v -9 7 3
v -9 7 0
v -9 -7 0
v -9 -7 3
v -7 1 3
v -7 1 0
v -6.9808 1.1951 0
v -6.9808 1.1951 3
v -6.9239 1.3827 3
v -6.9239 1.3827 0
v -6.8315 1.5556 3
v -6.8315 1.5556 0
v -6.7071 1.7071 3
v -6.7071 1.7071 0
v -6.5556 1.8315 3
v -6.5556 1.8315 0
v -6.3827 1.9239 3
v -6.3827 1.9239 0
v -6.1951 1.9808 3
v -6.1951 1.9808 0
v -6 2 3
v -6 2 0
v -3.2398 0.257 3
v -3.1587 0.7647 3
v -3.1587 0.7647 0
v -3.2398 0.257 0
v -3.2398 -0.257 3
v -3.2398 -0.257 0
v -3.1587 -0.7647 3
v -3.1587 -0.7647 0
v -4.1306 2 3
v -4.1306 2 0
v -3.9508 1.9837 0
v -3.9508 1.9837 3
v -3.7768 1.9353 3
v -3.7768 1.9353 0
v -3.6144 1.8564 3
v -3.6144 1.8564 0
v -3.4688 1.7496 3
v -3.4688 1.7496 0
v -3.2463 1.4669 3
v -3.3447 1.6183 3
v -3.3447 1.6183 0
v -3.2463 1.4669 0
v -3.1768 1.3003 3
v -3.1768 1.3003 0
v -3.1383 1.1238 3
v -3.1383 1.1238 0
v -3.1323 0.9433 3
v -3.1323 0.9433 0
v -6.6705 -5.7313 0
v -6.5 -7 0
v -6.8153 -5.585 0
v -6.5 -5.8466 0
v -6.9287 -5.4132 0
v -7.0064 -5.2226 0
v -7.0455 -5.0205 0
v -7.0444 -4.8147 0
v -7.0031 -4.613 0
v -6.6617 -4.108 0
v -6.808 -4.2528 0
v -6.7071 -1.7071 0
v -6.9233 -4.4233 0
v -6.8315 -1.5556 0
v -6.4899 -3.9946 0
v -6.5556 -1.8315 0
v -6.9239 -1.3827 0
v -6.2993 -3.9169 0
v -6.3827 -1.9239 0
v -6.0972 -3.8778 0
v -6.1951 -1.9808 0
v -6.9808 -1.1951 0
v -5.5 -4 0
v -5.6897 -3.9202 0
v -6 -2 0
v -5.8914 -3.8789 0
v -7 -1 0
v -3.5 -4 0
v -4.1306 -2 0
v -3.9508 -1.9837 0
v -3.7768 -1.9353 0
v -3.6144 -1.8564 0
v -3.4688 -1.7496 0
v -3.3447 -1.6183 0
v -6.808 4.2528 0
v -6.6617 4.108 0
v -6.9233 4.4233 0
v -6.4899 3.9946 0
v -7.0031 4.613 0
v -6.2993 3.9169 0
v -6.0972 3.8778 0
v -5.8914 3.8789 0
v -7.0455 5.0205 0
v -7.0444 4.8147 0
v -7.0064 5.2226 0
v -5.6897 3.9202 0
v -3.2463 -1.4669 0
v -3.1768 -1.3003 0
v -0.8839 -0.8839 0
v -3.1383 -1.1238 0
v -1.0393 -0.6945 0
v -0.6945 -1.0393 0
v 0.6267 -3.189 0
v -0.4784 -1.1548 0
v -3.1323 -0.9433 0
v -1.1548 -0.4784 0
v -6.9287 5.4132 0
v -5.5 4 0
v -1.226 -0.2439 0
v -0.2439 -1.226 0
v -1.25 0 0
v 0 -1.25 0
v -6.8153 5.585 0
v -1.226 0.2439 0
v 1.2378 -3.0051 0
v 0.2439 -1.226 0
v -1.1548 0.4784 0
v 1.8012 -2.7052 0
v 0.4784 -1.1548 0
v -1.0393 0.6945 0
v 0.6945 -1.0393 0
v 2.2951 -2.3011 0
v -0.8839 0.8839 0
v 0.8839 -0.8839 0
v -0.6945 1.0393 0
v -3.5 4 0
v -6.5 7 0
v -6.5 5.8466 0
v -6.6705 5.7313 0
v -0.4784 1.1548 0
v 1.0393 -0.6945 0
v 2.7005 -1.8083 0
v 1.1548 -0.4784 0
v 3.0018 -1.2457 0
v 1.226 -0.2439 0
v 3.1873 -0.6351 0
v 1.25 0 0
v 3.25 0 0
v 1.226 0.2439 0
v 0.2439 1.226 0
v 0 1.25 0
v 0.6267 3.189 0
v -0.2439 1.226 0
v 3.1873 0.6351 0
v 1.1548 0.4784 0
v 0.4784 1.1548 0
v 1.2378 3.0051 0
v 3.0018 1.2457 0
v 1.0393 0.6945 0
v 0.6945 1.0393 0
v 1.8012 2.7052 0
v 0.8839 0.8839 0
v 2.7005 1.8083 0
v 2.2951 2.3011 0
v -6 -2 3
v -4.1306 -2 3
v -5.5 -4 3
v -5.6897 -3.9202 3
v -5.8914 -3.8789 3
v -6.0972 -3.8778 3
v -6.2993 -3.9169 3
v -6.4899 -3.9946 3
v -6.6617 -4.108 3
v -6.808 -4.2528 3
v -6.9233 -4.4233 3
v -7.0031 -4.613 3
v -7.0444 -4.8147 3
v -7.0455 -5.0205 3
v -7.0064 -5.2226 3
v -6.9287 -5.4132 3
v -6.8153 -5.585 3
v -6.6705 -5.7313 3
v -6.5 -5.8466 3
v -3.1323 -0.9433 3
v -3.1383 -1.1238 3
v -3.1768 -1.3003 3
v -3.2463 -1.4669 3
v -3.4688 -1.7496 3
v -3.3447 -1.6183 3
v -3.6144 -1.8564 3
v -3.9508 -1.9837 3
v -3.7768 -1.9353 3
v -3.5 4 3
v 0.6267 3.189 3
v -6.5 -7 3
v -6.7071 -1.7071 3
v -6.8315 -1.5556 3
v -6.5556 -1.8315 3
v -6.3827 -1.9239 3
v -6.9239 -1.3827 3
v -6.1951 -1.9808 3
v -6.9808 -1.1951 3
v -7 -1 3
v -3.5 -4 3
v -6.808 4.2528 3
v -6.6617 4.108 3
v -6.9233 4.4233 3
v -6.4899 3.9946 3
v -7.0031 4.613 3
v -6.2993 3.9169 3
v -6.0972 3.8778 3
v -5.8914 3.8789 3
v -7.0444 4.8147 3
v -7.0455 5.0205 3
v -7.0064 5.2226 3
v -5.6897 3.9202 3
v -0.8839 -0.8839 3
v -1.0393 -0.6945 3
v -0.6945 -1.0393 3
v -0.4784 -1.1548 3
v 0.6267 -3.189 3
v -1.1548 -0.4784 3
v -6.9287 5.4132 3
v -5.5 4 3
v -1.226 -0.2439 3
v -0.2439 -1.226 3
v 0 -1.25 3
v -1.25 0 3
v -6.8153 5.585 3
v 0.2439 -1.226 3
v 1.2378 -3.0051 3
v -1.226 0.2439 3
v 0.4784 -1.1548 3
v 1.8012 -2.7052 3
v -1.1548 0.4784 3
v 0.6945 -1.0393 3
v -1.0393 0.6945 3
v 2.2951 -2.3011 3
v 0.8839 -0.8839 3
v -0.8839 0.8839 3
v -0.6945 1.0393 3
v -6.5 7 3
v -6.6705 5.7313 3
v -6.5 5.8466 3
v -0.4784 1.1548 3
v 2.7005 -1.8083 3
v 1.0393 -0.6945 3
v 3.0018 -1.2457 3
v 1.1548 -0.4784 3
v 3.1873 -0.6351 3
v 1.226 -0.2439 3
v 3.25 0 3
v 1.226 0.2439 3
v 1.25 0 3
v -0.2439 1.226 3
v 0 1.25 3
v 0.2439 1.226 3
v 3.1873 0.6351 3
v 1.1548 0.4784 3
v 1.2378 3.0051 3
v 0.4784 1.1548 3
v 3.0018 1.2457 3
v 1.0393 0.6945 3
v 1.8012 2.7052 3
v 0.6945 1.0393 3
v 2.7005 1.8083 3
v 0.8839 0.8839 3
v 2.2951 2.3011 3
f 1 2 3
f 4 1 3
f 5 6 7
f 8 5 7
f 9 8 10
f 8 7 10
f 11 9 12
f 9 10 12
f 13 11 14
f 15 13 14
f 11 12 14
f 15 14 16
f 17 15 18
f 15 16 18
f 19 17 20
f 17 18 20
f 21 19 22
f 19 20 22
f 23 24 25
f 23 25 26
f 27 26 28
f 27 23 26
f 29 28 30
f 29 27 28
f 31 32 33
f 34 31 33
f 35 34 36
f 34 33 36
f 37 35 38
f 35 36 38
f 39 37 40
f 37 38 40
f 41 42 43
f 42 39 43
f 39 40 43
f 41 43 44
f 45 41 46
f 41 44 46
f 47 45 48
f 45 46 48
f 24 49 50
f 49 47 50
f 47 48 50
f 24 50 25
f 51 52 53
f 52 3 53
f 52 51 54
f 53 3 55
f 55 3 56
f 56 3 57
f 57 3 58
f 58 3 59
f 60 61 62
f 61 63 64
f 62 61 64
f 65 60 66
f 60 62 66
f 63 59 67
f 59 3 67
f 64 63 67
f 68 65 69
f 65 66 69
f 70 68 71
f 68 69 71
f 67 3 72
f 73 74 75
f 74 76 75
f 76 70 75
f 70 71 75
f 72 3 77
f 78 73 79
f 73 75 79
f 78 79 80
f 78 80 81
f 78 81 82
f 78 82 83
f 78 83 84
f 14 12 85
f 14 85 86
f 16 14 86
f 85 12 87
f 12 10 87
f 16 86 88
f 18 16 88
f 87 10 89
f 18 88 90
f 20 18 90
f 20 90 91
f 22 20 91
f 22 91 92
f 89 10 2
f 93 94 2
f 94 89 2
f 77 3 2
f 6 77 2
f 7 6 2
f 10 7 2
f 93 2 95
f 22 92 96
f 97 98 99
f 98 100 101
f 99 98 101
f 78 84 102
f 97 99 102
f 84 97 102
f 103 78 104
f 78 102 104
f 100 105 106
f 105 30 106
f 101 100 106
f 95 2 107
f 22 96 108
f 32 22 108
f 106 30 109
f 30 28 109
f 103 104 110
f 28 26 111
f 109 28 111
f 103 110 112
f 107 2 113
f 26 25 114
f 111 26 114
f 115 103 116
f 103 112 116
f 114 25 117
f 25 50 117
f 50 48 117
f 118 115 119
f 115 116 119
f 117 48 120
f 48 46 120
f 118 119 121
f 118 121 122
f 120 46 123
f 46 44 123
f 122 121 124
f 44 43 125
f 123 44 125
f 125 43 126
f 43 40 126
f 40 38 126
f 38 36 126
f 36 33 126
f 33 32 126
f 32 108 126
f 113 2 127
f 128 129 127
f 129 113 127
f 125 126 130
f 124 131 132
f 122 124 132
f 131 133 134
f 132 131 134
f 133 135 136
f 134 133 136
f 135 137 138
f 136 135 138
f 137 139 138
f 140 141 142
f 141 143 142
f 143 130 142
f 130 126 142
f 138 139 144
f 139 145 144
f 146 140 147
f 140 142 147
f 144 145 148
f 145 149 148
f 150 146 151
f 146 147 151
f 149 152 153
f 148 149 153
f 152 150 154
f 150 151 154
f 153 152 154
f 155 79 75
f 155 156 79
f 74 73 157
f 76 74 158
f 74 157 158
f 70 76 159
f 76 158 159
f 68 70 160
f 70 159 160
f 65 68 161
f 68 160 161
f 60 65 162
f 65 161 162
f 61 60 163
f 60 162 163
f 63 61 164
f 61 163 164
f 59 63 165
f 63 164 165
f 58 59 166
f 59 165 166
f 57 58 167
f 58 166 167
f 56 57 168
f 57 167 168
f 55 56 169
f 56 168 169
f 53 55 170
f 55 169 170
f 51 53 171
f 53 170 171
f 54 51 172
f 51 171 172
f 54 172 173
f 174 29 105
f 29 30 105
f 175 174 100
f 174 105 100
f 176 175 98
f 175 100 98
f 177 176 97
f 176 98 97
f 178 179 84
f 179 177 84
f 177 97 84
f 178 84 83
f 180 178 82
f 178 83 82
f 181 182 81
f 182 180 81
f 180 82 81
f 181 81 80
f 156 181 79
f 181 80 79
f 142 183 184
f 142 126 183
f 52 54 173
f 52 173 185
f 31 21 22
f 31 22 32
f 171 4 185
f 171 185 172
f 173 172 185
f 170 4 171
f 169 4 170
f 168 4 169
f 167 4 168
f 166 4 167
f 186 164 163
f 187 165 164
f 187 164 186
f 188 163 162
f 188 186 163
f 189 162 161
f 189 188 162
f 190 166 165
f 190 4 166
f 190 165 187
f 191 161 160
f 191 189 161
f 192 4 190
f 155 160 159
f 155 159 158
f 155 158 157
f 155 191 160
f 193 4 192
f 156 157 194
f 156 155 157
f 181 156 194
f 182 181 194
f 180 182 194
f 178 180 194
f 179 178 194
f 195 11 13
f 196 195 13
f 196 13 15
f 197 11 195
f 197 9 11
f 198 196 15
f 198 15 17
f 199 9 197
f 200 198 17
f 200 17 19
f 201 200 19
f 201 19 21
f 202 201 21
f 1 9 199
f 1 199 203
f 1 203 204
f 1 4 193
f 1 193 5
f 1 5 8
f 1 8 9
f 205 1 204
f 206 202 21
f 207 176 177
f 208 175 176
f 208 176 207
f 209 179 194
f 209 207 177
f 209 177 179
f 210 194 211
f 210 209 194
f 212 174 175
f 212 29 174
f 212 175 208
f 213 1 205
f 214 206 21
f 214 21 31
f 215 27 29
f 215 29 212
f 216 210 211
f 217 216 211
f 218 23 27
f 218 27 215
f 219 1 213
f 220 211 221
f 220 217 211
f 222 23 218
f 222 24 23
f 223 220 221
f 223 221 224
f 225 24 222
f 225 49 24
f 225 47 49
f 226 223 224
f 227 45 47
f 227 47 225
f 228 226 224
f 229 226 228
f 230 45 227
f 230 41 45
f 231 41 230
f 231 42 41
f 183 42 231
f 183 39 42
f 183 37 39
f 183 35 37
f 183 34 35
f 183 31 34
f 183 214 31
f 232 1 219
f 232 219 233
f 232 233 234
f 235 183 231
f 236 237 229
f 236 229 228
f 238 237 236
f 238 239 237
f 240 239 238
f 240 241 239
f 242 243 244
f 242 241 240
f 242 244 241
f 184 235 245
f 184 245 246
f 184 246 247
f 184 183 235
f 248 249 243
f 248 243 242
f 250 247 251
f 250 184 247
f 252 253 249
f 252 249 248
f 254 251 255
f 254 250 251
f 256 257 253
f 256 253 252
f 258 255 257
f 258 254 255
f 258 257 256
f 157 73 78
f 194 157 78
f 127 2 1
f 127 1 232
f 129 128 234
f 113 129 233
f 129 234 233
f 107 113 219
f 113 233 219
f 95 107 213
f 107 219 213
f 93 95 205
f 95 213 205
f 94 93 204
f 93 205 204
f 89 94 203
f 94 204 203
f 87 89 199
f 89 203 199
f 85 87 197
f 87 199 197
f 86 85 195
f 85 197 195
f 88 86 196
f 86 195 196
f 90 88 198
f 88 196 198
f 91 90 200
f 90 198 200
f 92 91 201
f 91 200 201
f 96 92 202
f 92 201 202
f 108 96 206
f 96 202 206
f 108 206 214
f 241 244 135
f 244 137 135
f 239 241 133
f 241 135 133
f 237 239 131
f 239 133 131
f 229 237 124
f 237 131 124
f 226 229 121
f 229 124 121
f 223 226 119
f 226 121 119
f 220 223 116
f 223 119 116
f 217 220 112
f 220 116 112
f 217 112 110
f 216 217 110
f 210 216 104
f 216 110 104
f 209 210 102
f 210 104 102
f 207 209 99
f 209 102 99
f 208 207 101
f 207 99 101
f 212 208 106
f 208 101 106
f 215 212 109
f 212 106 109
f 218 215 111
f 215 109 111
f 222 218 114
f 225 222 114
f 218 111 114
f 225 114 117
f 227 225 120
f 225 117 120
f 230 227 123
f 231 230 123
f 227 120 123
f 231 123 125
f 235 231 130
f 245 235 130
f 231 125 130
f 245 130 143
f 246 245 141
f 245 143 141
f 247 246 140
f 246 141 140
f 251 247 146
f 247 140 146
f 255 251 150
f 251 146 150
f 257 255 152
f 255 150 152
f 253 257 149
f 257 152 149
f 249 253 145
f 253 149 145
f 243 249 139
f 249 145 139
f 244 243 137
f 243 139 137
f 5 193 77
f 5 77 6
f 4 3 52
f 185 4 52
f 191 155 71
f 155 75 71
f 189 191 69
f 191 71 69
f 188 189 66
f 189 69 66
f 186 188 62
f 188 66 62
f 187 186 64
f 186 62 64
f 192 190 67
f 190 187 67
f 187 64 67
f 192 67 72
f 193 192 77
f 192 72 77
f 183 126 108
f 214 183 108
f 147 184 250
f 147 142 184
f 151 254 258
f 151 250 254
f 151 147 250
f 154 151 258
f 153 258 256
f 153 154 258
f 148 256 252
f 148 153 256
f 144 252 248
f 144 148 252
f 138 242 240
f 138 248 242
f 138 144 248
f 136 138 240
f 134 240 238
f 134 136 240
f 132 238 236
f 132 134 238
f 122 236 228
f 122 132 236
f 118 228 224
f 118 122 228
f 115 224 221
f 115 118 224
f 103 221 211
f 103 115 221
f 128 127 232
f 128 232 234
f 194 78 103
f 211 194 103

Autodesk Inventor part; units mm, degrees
ref_plane "YZ Plane" through (0, 0, 0) normal (1, 0, 0) x (0, 1, 0)
ref_plane "XZ Plane" through (0, 0, 0) normal (0, 1, 0) x (-1, 0, 0)
ref_plane "XY Plane" through (0, 0, 0) normal (0, 0, 1) x (1, 0, 0)
sketch "スケッチ1" plane through (0, 0, 0) normal (0, 0, 1) x (1, 0, 0)
  circle A0 centre (0, 0) radius 1.25
  arc A1 (0.6267, -3.189) -> (0.6267, 3.189) centre (0, 0) ccw
  line L0 (0, 0) -> (-4.5, 0)
  line L1 (-4.5, -4.1965) -> (-4.5, -4)
  line L2 (-4.5, 4) -> (-3.5, 4)
  line L3 (-3.5, 4) -> (0.6267, 3.189)
  line L4 (-4.5, -4) -> (-3.5, -4)
  line L5 (-3.5, -4) -> (0.6267, -3.189)
  line L6 (-4.5, 4) -> (-6.5, 4)
  line L7 (-4.5, -4) -> (-6.5, -4)
  line L8 (-9, 7) -> (-9, -7)
  line L9 (-9, -7) -> (-6.5, -7)
  line L10 (-9, 7) -> (-6.5, 7)
  line L11 (-6.5, 7) -> (-6.5, 4)
  line L12 (-6.5, -4) -> (-6.5, -7)
  dimension "d0" = 2.5
  dimension "d3" = 8
  dimension "d5" = 8
  dimension "d6" = 2
  dimension "d7" = 2
  dimension "d8" = 3
  dimension "d14" = 1
  dimension "d17" = 3
  dimension "d32" = 14
  dimension "d33" = 2.5
  dimension "d35" = 2
extrude "押し出し1" add sketch "スケッチ1" along normal blind 3
sketch "スケッチ2" plane through (0, 0, 3) normal (0, 0, 1) x (1, 0, 0)
  line L0 (-6.5, 7) -> (-6.5, 4) projected
  circle A0 centre (-6, -4.9233) radius 1.05
  circle A1 centre (-6, 4.9233) radius 1.05
  point P0 (-4.5, 4)
  point P1 (-4.5, -4)
  dimension "d13" = 2.1
  dimension "d12" = 2.1
  dimension "d15" = 0.5
extrude "押し出し2" cut sketch "スケッチ2" against normal blind 3
sketch "スケッチ4" plane through (0, 0, 3) normal (0, 0, 1) x (1, 0, 0)
  line L0 (-9, -7) -> (-9, 7) projected
  line L1 (-3.5, -4) -> (-5.5, -4) projected
  line L2 (0.6267, -3.189) -> (-3.5, -4) projected
  line L3 (-3.5, 4) -> (0.6267, 3.189) projected
  line L4 (-5.5, 4) -> (-3.5, 4) projected
  circle A0 centre (0, 0) radius 1.25 projected
  line L5 (-7, 2) -> (-2.5617, 2)
  line L6 (-2.5617, -2) -> (-7, -2)
  line L7 (-7, -2) -> (-7, 2)
  arc A1 (-2.5617, 2) -> (-2.5617, -2) centre (0, 0) ccw
  arc A2 (0.6267, -3.189) -> (0.6267, 3.189) centre (0, 0) ccw
  dimension "d23" = 2
  dimension "d24" = 2
  dimension "d25" = 2
extrude "押し出し3" cut sketch "スケッチ4" against normal blind 3 contours L5 A1 L6 L7
fillet "フィレット1" radius 1 4 edges at (-2.5617, -2, 1.5) (-2.5617, 2, 1.5) (-7, -2, 1.5) (-7, 2, 1.5)
properties part number "アームユニット底板締結パーツ3t用" material "アルミニウム 2014-T4"
